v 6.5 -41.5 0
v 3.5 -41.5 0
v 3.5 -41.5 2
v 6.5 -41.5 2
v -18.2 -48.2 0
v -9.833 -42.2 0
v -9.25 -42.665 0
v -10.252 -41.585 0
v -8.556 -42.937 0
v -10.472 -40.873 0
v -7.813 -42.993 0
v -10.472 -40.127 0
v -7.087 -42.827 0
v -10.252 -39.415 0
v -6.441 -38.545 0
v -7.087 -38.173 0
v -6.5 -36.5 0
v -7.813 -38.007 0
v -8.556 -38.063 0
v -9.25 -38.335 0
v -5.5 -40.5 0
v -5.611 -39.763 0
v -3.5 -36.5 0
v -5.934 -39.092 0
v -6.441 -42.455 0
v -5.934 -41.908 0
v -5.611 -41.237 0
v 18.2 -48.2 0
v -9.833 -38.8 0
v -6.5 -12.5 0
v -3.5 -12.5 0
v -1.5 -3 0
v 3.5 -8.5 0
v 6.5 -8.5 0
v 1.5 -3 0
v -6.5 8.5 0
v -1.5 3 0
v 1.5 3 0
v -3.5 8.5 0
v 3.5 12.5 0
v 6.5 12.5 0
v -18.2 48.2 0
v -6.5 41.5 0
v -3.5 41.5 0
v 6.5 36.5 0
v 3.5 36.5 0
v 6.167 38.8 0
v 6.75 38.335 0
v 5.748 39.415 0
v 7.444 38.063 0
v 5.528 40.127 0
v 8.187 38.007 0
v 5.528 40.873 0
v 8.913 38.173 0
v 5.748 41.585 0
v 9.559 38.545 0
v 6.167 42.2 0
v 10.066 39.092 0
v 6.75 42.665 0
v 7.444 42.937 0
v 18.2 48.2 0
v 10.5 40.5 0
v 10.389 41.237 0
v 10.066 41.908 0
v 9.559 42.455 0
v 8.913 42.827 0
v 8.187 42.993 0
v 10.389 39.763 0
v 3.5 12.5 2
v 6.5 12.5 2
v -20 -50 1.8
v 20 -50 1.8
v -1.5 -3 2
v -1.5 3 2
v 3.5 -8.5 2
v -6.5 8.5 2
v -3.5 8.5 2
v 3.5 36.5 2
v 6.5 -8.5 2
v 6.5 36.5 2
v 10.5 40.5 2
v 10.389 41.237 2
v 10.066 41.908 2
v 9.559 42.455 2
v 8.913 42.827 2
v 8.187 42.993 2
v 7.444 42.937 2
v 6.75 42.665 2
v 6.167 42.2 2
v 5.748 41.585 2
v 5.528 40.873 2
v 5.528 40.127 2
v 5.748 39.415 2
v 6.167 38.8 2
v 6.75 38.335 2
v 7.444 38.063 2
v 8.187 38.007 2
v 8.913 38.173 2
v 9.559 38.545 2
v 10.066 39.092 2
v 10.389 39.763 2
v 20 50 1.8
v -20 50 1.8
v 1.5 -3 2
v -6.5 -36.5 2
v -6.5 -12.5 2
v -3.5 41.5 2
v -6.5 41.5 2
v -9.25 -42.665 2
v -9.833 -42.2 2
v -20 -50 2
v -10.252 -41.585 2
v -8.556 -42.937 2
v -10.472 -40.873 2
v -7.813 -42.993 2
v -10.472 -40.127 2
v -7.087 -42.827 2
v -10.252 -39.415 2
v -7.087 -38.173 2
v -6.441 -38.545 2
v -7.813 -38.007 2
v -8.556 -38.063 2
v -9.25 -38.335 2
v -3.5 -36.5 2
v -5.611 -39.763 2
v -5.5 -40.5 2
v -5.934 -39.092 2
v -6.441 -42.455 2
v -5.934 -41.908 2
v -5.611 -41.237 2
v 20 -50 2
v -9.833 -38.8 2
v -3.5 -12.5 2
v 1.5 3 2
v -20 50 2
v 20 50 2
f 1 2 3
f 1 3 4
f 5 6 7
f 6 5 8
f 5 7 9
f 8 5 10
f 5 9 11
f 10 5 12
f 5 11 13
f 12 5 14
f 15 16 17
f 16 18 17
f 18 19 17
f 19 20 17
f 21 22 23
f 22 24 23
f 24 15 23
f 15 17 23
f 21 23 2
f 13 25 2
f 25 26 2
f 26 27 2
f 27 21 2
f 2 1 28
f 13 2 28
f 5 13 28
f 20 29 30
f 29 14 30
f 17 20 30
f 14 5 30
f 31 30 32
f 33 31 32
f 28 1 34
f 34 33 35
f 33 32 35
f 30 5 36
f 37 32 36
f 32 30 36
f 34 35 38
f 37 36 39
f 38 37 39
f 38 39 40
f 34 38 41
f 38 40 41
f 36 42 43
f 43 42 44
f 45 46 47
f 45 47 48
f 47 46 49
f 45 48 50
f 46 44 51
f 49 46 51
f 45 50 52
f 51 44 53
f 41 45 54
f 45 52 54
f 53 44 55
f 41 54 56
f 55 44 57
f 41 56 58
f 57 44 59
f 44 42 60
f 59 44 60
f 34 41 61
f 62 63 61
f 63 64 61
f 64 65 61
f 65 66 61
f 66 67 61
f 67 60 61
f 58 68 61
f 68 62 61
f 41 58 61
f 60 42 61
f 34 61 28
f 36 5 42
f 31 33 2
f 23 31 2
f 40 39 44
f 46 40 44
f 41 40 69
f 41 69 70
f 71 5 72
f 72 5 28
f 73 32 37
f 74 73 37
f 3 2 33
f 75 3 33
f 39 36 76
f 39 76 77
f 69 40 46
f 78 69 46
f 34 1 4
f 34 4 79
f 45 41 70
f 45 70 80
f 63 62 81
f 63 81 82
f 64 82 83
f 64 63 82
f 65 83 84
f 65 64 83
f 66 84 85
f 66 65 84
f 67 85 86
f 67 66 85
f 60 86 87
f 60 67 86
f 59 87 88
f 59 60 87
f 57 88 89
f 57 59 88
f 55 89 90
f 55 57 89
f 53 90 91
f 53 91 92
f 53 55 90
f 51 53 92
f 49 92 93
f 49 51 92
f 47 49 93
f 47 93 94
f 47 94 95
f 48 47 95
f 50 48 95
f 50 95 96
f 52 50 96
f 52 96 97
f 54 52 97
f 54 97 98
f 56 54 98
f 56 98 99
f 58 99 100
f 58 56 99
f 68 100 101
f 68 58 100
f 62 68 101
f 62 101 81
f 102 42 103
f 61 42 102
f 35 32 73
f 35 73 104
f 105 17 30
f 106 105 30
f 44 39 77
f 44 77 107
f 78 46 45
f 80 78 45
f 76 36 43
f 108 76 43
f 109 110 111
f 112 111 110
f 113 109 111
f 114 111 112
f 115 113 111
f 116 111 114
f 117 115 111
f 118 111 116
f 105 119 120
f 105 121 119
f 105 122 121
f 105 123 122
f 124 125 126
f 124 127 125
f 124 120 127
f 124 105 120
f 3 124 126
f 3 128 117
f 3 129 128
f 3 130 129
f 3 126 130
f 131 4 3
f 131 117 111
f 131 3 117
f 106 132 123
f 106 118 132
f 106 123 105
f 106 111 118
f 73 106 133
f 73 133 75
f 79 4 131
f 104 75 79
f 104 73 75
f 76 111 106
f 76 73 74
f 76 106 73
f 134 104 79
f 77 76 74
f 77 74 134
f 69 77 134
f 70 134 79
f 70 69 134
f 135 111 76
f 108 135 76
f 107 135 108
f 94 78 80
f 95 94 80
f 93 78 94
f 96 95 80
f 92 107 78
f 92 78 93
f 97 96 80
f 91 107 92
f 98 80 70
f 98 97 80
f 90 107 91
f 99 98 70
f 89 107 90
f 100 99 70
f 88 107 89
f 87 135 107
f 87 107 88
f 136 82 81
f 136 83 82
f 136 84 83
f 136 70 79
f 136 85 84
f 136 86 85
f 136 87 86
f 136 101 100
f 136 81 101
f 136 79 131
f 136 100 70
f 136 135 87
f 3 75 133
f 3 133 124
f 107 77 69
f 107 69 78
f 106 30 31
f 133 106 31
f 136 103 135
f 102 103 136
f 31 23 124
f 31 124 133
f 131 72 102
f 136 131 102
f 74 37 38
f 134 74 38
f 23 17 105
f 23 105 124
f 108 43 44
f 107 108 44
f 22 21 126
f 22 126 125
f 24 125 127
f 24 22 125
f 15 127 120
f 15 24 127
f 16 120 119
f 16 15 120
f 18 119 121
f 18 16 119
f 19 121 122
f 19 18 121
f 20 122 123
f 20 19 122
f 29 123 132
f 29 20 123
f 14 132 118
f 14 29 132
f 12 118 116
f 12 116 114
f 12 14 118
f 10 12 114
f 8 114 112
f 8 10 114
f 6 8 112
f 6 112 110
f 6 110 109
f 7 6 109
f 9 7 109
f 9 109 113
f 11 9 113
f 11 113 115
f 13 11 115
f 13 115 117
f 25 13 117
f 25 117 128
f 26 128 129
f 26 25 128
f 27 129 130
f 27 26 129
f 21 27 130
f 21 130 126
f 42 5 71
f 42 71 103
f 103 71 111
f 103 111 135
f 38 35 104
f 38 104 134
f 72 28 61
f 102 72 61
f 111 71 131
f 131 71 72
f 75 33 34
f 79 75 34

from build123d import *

# Parameters (mm, degrees)
SKETCH_W     = 40
SKETCH_H     = 100
SKETCH_R     = 2.5
SKETCH_W_2   = 3
SKETCH_H_2   = 33
SKETCH_H_3   = 24
SKETCH_H_4   = 6
PAD_DEPTH    = 2
CHAMFER_SIZE = 1.8


with BuildPart() as part:
    # Sketch → Pad (new body)
    with BuildSketch(Plane.XY):
        Rectangle(SKETCH_W, SKETCH_H)
        with Locations((-8, -40.5)):
            Circle(SKETCH_R, mode=Mode.SUBTRACT)
        with Locations((8, 40.5)):
            Circle(SKETCH_R, mode=Mode.SUBTRACT)
        with Locations((-5, 25)):
            Rectangle(SKETCH_W_2, SKETCH_H_2, mode=Mode.SUBTRACT)
        with Locations((5, -25)):
            Rectangle(SKETCH_W_2, SKETCH_H_2, mode=Mode.SUBTRACT)
        with Locations((5, 24.5)):
            Rectangle(SKETCH_W_2, SKETCH_H_3, mode=Mode.SUBTRACT)
        with Locations((-5, -24.5)):
            Rectangle(SKETCH_W_2, SKETCH_H_3, mode=Mode.SUBTRACT)
        Rectangle(SKETCH_W_2, SKETCH_H_4, mode=Mode.SUBTRACT)
    extrude(amount=PAD_DEPTH)

    # Chamfer
    chamfer_edges = [part.edges().sort_by_distance(p)[0] for p in [
        (0, -50, 0),
        (20, 0, 0),
        (0, 50, 0),
        (-20, 0, 0),
    ]]
    chamfer(chamfer_edges, length=CHAMFER_SIZE)


solid = part.part
